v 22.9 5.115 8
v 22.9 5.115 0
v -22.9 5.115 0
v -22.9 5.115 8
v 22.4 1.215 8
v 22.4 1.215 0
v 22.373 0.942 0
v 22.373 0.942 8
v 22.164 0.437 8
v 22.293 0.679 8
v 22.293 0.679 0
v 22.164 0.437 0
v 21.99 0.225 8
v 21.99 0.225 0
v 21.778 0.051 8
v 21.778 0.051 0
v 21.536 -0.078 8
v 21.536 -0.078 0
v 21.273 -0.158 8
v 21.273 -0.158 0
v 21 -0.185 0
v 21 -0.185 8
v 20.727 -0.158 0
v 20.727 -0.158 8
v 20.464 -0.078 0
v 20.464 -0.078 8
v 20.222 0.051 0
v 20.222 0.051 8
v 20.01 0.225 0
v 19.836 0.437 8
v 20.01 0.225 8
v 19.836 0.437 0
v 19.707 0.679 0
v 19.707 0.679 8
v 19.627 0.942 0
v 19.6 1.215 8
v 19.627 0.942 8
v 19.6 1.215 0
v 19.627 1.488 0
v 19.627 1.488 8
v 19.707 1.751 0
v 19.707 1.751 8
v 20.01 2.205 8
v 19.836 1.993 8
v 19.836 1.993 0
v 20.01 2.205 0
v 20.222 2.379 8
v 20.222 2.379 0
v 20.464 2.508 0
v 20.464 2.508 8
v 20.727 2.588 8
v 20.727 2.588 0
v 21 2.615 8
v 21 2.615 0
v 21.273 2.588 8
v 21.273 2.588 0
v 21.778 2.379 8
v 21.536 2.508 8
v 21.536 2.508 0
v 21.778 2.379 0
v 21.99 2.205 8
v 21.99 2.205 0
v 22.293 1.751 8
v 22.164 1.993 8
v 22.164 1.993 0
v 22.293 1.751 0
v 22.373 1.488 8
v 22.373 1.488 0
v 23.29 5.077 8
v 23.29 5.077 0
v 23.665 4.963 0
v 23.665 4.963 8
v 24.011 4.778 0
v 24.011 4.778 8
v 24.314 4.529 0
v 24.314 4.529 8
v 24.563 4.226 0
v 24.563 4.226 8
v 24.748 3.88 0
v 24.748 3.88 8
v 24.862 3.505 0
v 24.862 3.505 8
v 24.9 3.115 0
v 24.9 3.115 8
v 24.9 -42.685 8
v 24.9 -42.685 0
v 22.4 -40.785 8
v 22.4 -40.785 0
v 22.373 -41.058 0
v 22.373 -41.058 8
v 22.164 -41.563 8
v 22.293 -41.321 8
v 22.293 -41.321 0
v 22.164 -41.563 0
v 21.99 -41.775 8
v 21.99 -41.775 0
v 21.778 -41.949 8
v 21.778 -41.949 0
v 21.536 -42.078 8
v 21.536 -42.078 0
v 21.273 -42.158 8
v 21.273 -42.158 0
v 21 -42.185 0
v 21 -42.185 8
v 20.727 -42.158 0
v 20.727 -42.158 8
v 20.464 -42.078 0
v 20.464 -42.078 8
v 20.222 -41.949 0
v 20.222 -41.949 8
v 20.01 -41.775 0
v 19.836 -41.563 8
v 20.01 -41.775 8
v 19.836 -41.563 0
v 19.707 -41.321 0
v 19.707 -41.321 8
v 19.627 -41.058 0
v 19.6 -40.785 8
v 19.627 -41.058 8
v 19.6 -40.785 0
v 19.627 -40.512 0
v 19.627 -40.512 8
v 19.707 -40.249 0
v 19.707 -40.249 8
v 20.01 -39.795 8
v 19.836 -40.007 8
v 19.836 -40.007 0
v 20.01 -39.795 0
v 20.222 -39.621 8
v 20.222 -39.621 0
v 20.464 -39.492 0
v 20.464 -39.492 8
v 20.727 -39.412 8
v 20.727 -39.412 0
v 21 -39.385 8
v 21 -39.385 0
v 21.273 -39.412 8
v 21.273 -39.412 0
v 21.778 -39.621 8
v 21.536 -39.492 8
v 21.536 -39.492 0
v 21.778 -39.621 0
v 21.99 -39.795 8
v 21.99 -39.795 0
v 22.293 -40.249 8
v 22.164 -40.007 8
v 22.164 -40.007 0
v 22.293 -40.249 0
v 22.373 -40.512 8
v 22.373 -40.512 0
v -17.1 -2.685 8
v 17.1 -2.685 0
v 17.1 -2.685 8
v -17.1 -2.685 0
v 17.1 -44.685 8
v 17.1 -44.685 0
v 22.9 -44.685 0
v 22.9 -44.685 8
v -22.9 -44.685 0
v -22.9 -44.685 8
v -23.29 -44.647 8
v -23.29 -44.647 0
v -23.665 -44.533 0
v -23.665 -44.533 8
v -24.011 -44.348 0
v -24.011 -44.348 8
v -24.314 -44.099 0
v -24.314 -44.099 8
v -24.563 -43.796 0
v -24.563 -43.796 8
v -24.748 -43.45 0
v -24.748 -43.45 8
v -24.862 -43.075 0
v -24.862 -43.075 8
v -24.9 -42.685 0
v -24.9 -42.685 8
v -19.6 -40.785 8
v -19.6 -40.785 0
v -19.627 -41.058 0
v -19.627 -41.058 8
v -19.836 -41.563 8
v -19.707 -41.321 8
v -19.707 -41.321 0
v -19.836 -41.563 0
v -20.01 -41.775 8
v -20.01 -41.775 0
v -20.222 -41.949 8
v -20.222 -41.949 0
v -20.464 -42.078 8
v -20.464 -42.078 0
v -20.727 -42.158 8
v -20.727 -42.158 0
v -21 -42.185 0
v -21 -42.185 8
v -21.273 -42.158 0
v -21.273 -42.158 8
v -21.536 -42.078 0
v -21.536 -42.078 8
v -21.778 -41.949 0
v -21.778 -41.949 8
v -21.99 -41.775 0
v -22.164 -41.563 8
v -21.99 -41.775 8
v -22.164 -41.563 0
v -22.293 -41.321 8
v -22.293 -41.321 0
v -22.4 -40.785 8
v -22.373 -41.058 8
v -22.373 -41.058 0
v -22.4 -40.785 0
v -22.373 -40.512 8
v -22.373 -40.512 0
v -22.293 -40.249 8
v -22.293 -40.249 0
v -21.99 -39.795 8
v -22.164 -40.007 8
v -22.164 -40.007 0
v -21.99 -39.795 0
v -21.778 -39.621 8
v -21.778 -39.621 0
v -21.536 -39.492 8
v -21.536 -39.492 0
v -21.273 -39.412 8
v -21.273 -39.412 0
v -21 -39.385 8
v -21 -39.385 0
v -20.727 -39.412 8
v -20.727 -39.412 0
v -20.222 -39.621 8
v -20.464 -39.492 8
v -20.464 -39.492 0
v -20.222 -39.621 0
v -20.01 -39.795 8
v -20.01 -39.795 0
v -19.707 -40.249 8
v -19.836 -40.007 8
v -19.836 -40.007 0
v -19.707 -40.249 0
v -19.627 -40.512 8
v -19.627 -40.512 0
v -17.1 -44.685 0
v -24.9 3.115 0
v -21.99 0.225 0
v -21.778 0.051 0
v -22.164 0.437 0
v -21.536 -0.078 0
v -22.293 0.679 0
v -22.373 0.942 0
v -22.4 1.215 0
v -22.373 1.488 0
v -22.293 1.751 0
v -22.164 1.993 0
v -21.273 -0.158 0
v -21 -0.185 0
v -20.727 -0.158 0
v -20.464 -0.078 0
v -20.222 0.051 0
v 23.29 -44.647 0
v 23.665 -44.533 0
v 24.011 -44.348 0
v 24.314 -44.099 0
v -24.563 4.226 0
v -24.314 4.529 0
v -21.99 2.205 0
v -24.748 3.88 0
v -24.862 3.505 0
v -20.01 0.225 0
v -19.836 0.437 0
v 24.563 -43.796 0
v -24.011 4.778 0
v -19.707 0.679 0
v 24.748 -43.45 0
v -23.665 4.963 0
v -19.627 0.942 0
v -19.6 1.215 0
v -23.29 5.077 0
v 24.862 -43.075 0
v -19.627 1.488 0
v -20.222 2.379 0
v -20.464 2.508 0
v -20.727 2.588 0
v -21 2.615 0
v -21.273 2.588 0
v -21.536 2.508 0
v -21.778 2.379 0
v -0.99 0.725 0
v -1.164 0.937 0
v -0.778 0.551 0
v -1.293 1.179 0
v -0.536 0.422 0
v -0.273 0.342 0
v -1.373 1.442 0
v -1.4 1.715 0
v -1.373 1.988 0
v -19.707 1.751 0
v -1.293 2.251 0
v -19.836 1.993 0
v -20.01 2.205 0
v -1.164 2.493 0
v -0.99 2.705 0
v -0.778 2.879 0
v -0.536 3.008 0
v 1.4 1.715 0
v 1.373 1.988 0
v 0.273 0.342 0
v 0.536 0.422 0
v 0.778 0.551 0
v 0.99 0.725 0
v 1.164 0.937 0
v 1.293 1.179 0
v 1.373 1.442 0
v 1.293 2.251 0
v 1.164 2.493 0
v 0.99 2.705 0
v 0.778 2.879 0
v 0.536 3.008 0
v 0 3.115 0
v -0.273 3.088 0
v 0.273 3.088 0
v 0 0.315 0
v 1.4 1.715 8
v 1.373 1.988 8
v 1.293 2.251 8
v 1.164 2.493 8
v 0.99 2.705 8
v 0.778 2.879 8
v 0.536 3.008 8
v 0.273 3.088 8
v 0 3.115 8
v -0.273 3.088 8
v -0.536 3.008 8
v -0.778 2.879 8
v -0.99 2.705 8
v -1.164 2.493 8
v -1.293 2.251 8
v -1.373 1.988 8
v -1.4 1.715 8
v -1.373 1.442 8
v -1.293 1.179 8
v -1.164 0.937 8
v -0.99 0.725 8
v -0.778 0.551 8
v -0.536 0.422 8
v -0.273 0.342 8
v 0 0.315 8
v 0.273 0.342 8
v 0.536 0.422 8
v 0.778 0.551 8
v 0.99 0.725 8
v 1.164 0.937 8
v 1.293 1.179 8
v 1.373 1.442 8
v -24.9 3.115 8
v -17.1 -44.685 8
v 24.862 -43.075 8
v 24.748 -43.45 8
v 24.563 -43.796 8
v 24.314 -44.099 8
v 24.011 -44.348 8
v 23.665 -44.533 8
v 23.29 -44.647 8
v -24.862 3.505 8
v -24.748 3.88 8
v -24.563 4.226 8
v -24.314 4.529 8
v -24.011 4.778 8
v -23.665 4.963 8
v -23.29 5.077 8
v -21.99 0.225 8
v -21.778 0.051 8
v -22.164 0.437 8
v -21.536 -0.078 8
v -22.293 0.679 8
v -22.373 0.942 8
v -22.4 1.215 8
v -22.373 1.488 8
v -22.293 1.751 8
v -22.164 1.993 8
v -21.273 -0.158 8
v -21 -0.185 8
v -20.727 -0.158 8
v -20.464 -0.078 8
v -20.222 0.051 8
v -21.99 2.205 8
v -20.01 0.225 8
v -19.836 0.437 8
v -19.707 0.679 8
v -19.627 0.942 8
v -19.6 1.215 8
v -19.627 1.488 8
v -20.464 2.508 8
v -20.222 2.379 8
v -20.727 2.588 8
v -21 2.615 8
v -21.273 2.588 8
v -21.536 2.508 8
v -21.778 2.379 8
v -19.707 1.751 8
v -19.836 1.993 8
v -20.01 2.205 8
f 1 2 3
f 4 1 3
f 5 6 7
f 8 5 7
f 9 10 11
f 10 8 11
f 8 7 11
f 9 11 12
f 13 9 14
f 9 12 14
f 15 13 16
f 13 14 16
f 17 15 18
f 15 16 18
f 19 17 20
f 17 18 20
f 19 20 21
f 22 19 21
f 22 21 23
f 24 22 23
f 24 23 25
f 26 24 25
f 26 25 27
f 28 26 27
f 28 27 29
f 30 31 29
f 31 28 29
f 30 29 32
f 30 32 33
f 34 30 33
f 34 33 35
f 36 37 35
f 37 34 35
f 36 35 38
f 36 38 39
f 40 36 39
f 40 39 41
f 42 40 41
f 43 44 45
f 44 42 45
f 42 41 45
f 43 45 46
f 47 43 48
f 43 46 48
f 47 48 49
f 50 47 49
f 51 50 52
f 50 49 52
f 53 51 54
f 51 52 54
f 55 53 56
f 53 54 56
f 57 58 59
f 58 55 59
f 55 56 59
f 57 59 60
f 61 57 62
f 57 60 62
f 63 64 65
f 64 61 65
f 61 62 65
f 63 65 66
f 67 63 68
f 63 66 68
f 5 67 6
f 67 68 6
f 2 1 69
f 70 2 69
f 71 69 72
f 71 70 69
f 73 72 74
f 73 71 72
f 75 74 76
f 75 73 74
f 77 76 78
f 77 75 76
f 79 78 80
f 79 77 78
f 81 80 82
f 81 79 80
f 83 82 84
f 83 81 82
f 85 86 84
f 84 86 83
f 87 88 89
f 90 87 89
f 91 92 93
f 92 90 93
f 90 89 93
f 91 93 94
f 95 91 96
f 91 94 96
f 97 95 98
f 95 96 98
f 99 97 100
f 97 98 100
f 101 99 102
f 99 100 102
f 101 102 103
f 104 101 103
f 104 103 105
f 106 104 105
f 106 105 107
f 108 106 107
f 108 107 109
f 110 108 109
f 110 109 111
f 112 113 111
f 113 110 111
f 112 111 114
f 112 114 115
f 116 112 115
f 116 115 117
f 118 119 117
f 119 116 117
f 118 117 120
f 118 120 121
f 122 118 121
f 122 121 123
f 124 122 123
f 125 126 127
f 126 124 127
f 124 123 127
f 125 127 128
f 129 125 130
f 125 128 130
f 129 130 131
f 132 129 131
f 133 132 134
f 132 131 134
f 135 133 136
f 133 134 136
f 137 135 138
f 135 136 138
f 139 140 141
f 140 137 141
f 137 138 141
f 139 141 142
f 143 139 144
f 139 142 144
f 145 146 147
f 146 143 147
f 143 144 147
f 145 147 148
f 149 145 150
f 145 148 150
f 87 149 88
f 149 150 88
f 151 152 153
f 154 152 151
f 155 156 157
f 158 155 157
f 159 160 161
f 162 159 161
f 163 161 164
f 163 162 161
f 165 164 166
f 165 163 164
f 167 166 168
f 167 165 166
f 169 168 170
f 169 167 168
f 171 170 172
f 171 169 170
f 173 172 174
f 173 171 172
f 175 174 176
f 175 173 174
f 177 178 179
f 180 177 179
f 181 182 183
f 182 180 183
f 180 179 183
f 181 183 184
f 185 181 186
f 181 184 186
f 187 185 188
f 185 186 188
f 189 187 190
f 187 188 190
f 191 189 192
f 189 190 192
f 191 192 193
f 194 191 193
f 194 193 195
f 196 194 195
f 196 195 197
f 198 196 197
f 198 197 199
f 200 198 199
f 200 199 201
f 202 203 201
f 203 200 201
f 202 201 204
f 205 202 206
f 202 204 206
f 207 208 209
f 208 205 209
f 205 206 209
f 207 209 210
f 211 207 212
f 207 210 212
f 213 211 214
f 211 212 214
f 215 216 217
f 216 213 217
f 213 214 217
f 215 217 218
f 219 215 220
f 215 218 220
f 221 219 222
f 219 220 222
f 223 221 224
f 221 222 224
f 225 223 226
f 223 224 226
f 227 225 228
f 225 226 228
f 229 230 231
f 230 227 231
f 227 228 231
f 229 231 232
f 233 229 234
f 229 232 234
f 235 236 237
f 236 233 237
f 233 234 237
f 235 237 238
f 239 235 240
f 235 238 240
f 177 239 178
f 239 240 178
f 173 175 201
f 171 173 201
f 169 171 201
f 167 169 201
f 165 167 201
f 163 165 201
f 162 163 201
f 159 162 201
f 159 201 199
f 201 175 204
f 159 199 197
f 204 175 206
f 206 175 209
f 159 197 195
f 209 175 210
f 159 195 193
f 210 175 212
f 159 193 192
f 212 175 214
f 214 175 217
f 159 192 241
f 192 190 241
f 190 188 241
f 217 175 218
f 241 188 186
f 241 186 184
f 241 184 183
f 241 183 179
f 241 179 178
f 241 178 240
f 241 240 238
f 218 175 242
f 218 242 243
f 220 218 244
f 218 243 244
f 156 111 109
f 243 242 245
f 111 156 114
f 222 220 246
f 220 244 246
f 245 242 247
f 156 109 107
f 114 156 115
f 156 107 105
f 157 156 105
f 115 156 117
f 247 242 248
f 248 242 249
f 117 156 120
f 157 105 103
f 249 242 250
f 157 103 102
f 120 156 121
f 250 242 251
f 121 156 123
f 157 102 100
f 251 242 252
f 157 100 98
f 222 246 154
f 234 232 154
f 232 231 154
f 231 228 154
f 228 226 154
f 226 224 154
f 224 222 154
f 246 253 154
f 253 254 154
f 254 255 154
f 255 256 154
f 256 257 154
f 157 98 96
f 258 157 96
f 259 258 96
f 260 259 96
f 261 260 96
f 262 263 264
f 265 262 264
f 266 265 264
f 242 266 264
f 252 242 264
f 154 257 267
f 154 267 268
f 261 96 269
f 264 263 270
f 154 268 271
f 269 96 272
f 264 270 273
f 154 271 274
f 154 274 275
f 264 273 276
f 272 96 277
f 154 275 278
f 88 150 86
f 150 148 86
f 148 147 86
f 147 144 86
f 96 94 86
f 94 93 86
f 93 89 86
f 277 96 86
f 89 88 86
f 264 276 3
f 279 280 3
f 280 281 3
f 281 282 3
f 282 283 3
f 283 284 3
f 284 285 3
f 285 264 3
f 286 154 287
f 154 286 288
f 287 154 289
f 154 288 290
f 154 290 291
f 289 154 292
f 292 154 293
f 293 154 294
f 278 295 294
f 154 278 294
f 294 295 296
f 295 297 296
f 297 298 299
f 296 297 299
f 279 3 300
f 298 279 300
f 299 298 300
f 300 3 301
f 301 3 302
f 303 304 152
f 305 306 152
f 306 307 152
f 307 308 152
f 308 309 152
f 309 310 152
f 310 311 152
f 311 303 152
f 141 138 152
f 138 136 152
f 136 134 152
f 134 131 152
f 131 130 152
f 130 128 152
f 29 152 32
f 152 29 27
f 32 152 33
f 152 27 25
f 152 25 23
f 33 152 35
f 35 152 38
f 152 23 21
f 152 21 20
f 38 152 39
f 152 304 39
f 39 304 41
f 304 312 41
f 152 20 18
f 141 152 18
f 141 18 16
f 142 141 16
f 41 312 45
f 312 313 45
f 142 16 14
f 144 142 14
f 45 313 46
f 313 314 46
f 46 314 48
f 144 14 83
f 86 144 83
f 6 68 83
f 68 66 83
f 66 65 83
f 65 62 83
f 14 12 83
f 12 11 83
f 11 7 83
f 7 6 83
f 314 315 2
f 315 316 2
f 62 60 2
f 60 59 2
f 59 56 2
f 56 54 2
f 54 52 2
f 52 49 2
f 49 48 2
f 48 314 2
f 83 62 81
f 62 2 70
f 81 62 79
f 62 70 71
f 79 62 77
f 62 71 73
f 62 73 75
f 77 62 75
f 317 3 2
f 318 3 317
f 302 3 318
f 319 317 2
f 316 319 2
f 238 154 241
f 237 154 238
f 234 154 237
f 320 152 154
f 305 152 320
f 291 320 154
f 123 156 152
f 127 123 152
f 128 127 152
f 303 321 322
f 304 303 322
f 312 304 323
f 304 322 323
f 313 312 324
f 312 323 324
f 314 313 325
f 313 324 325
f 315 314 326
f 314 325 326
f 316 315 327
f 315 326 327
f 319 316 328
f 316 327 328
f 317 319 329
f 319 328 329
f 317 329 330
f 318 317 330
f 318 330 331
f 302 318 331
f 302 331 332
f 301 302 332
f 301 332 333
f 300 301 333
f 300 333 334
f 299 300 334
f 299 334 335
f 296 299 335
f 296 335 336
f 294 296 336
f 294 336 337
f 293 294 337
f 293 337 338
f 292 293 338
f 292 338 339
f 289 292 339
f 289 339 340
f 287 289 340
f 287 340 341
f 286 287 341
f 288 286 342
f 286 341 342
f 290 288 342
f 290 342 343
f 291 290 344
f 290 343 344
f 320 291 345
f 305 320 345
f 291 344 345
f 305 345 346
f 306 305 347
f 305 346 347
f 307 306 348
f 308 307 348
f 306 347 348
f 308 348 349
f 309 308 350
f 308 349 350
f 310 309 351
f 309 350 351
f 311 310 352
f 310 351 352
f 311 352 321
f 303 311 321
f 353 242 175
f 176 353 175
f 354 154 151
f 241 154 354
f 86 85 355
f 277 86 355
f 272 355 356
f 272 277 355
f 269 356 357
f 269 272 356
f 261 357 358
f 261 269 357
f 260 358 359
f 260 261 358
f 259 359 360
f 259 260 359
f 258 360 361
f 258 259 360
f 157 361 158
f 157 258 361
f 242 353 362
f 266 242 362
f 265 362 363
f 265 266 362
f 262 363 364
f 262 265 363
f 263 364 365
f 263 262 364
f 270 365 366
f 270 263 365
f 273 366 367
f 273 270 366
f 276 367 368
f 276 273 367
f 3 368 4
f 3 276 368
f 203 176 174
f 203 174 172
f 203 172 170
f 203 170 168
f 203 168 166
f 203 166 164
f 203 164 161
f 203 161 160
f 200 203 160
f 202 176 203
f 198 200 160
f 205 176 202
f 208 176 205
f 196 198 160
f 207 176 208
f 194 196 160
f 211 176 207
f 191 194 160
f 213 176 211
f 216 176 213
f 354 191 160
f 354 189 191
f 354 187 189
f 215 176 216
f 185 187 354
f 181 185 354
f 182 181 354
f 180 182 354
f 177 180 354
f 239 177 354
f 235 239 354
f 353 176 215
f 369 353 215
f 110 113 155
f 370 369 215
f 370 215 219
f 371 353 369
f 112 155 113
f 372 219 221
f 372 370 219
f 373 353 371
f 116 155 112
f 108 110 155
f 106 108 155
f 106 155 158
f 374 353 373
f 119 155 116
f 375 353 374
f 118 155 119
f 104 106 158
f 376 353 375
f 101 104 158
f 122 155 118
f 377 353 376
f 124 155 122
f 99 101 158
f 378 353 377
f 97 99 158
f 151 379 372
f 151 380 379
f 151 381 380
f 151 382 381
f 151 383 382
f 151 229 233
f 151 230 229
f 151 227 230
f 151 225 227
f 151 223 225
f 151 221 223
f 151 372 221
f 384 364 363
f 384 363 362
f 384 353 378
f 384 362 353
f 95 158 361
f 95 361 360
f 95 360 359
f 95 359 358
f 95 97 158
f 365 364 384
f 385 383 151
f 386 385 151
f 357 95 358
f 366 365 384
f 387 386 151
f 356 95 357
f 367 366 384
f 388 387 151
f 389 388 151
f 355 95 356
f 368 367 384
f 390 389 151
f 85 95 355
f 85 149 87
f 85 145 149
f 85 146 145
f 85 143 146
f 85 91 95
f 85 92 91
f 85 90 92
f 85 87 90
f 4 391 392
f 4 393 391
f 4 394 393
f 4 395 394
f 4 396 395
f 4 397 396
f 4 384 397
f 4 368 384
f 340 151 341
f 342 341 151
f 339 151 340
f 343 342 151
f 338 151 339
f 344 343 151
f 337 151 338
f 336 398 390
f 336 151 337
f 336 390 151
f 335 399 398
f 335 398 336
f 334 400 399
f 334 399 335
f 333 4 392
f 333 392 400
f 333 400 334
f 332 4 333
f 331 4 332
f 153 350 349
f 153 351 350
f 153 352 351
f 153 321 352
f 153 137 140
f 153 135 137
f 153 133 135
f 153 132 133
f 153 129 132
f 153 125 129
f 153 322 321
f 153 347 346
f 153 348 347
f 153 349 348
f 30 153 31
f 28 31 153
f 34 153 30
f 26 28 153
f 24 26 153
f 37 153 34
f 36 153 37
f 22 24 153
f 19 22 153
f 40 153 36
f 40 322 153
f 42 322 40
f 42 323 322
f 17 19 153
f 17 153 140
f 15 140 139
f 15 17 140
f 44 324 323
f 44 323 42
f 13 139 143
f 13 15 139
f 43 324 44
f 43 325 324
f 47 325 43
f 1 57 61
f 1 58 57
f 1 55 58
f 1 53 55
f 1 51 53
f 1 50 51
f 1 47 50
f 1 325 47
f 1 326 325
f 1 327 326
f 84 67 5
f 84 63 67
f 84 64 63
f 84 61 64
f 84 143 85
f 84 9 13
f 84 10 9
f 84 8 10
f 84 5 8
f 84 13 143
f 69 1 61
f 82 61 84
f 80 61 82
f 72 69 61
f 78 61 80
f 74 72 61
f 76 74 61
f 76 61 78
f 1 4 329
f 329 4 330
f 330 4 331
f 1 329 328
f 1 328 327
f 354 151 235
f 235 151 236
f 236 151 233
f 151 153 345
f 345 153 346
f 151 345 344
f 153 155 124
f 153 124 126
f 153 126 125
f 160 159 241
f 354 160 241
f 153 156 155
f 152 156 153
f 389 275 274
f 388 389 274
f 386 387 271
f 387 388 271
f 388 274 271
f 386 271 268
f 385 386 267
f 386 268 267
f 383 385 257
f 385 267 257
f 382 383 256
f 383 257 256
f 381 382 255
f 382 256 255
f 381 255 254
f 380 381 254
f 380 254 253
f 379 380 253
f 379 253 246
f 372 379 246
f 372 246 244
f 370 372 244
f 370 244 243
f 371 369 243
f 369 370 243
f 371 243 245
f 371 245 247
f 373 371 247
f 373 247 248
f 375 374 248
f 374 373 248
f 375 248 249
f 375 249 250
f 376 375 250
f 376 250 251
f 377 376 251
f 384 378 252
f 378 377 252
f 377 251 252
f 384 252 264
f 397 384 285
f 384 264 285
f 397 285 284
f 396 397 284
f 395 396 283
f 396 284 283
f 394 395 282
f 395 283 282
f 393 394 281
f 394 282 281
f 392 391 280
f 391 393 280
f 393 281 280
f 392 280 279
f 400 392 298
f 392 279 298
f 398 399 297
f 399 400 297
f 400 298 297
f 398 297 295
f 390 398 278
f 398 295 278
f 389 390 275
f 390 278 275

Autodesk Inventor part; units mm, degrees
ref_plane "YZ Plane" through (0, 0, 0) normal (1, 0, 0) x (0, 1, 0)
ref_plane "XZ Plane" through (0, 0, 0) normal (0, 1, 0) x (-1, 0, 0)
ref_plane "XY Plane" through (0, 0, 0) normal (0, 0, 1) x (1, 0, 0)
sketch "Sketch1" plane through (0, 0, 0) normal (0, 0, 1) x (1, 0, 0)
  circle A0 centre (-21, 1.215) radius 1.4 projected
  circle A1 centre (21, 1.215) radius 1.4 projected
  arc A2 (24.9, 3.115) -> (22.9, 5.115) centre (22.9, 3.115) ccw projected
  line L0 (22.9, 5.115) -> (-22.9, 5.115) projected
  arc A3 (-22.9, 5.115) -> (-24.9, 3.115) centre (-22.9, 3.115) ccw projected
  line L1 (-24.9, 3.115) -> (-24.9, -5.115) projected
  line L2 (-24.9, -5.115) -> (24.9, -5.115) projected
  line L3 (24.9, -5.115) -> (24.9, 3.115) projected
  arc A4 (22.9, -44.685) -> (24.9, -42.685) centre (22.9, -42.685) ccw projected
  line L4 (24.9, -42.685) -> (24.9, -36.885) projected
  line L5 (24.9, -36.885) -> (17.1, -36.885) projected
  line L6 (17.1, -36.885) -> (17.1, -44.685) projected
  line L7 (17.1, -44.685) -> (22.9, -44.685) projected
  circle A5 centre (21, -40.785) radius 1.4 projected
  arc A6 (-24.9, -42.685) -> (-22.9, -44.685) centre (-22.9, -42.685) ccw projected
  line L8 (-22.9, -44.685) -> (-17.1, -44.685) projected
  line L9 (-17.1, -44.685) -> (-17.1, -36.885) projected
  line L10 (-17.1, -36.885) -> (-24.9, -36.885) projected
  line L11 (-24.9, -36.885) -> (-24.9, -42.685) projected
  circle A7 centre (-21, -40.785) radius 1.4 projected
  line L12 (24.9, 5.115) -> (-24.9, 5.115)
  line L13 (-24.9, 5.115) -> (-24.9, -44.685)
  line L14 (-24.9, -44.685) -> (24.9, -44.685)
  line L15 (24.9, -44.685) -> (24.9, 5.115)
  line L16 (17.1, -2.685) -> (-17.1, -2.685)
  line L17 (-17.1, -2.685) -> (-17.1, -36.885)
  line L18 (-17.1, -36.885) -> (17.1, -36.885)
  line L19 (17.1, -36.885) -> (17.1, -2.685)
  line L20 (17.1, -36.885) -> (17.1, -44.685)
  line L21 (-17.1, -36.885) -> (-17.1, -44.685)
  circle A8 centre (0, 1.415) radius 1.4 projected
  point P0 (0, 0)
  dimension "d0" = 7.8
extrude "Extrusion1" add sketch "Sketch1" along normal blind 8 contours L3 L2 L19 L16 L17 L1 A3 L0 A2 | L15 L5 L19 L2 | L4 A4 L7 L6 L5 | L17 L10 L13 L2 | L9 L8 A6 L11 L10 | A8
sketch "Sketch2" plane through (0, 0, 8) normal (0, 0, 1) x (1, 0, 0)
  circle A0 centre (0, 1.715) radius 1.4
  line L0 (22.9, 5.115) -> (-22.9, 5.115) projected
  point P0 (0, 0)
  dimension "d3" = 2.8
  dimension "d4" = 3.4
extrude "Extrusion2" cut sketch "Sketch2" against normal blind 8
properties part number "00_Linear_Stage_NEMA11_Mount_Lid"
